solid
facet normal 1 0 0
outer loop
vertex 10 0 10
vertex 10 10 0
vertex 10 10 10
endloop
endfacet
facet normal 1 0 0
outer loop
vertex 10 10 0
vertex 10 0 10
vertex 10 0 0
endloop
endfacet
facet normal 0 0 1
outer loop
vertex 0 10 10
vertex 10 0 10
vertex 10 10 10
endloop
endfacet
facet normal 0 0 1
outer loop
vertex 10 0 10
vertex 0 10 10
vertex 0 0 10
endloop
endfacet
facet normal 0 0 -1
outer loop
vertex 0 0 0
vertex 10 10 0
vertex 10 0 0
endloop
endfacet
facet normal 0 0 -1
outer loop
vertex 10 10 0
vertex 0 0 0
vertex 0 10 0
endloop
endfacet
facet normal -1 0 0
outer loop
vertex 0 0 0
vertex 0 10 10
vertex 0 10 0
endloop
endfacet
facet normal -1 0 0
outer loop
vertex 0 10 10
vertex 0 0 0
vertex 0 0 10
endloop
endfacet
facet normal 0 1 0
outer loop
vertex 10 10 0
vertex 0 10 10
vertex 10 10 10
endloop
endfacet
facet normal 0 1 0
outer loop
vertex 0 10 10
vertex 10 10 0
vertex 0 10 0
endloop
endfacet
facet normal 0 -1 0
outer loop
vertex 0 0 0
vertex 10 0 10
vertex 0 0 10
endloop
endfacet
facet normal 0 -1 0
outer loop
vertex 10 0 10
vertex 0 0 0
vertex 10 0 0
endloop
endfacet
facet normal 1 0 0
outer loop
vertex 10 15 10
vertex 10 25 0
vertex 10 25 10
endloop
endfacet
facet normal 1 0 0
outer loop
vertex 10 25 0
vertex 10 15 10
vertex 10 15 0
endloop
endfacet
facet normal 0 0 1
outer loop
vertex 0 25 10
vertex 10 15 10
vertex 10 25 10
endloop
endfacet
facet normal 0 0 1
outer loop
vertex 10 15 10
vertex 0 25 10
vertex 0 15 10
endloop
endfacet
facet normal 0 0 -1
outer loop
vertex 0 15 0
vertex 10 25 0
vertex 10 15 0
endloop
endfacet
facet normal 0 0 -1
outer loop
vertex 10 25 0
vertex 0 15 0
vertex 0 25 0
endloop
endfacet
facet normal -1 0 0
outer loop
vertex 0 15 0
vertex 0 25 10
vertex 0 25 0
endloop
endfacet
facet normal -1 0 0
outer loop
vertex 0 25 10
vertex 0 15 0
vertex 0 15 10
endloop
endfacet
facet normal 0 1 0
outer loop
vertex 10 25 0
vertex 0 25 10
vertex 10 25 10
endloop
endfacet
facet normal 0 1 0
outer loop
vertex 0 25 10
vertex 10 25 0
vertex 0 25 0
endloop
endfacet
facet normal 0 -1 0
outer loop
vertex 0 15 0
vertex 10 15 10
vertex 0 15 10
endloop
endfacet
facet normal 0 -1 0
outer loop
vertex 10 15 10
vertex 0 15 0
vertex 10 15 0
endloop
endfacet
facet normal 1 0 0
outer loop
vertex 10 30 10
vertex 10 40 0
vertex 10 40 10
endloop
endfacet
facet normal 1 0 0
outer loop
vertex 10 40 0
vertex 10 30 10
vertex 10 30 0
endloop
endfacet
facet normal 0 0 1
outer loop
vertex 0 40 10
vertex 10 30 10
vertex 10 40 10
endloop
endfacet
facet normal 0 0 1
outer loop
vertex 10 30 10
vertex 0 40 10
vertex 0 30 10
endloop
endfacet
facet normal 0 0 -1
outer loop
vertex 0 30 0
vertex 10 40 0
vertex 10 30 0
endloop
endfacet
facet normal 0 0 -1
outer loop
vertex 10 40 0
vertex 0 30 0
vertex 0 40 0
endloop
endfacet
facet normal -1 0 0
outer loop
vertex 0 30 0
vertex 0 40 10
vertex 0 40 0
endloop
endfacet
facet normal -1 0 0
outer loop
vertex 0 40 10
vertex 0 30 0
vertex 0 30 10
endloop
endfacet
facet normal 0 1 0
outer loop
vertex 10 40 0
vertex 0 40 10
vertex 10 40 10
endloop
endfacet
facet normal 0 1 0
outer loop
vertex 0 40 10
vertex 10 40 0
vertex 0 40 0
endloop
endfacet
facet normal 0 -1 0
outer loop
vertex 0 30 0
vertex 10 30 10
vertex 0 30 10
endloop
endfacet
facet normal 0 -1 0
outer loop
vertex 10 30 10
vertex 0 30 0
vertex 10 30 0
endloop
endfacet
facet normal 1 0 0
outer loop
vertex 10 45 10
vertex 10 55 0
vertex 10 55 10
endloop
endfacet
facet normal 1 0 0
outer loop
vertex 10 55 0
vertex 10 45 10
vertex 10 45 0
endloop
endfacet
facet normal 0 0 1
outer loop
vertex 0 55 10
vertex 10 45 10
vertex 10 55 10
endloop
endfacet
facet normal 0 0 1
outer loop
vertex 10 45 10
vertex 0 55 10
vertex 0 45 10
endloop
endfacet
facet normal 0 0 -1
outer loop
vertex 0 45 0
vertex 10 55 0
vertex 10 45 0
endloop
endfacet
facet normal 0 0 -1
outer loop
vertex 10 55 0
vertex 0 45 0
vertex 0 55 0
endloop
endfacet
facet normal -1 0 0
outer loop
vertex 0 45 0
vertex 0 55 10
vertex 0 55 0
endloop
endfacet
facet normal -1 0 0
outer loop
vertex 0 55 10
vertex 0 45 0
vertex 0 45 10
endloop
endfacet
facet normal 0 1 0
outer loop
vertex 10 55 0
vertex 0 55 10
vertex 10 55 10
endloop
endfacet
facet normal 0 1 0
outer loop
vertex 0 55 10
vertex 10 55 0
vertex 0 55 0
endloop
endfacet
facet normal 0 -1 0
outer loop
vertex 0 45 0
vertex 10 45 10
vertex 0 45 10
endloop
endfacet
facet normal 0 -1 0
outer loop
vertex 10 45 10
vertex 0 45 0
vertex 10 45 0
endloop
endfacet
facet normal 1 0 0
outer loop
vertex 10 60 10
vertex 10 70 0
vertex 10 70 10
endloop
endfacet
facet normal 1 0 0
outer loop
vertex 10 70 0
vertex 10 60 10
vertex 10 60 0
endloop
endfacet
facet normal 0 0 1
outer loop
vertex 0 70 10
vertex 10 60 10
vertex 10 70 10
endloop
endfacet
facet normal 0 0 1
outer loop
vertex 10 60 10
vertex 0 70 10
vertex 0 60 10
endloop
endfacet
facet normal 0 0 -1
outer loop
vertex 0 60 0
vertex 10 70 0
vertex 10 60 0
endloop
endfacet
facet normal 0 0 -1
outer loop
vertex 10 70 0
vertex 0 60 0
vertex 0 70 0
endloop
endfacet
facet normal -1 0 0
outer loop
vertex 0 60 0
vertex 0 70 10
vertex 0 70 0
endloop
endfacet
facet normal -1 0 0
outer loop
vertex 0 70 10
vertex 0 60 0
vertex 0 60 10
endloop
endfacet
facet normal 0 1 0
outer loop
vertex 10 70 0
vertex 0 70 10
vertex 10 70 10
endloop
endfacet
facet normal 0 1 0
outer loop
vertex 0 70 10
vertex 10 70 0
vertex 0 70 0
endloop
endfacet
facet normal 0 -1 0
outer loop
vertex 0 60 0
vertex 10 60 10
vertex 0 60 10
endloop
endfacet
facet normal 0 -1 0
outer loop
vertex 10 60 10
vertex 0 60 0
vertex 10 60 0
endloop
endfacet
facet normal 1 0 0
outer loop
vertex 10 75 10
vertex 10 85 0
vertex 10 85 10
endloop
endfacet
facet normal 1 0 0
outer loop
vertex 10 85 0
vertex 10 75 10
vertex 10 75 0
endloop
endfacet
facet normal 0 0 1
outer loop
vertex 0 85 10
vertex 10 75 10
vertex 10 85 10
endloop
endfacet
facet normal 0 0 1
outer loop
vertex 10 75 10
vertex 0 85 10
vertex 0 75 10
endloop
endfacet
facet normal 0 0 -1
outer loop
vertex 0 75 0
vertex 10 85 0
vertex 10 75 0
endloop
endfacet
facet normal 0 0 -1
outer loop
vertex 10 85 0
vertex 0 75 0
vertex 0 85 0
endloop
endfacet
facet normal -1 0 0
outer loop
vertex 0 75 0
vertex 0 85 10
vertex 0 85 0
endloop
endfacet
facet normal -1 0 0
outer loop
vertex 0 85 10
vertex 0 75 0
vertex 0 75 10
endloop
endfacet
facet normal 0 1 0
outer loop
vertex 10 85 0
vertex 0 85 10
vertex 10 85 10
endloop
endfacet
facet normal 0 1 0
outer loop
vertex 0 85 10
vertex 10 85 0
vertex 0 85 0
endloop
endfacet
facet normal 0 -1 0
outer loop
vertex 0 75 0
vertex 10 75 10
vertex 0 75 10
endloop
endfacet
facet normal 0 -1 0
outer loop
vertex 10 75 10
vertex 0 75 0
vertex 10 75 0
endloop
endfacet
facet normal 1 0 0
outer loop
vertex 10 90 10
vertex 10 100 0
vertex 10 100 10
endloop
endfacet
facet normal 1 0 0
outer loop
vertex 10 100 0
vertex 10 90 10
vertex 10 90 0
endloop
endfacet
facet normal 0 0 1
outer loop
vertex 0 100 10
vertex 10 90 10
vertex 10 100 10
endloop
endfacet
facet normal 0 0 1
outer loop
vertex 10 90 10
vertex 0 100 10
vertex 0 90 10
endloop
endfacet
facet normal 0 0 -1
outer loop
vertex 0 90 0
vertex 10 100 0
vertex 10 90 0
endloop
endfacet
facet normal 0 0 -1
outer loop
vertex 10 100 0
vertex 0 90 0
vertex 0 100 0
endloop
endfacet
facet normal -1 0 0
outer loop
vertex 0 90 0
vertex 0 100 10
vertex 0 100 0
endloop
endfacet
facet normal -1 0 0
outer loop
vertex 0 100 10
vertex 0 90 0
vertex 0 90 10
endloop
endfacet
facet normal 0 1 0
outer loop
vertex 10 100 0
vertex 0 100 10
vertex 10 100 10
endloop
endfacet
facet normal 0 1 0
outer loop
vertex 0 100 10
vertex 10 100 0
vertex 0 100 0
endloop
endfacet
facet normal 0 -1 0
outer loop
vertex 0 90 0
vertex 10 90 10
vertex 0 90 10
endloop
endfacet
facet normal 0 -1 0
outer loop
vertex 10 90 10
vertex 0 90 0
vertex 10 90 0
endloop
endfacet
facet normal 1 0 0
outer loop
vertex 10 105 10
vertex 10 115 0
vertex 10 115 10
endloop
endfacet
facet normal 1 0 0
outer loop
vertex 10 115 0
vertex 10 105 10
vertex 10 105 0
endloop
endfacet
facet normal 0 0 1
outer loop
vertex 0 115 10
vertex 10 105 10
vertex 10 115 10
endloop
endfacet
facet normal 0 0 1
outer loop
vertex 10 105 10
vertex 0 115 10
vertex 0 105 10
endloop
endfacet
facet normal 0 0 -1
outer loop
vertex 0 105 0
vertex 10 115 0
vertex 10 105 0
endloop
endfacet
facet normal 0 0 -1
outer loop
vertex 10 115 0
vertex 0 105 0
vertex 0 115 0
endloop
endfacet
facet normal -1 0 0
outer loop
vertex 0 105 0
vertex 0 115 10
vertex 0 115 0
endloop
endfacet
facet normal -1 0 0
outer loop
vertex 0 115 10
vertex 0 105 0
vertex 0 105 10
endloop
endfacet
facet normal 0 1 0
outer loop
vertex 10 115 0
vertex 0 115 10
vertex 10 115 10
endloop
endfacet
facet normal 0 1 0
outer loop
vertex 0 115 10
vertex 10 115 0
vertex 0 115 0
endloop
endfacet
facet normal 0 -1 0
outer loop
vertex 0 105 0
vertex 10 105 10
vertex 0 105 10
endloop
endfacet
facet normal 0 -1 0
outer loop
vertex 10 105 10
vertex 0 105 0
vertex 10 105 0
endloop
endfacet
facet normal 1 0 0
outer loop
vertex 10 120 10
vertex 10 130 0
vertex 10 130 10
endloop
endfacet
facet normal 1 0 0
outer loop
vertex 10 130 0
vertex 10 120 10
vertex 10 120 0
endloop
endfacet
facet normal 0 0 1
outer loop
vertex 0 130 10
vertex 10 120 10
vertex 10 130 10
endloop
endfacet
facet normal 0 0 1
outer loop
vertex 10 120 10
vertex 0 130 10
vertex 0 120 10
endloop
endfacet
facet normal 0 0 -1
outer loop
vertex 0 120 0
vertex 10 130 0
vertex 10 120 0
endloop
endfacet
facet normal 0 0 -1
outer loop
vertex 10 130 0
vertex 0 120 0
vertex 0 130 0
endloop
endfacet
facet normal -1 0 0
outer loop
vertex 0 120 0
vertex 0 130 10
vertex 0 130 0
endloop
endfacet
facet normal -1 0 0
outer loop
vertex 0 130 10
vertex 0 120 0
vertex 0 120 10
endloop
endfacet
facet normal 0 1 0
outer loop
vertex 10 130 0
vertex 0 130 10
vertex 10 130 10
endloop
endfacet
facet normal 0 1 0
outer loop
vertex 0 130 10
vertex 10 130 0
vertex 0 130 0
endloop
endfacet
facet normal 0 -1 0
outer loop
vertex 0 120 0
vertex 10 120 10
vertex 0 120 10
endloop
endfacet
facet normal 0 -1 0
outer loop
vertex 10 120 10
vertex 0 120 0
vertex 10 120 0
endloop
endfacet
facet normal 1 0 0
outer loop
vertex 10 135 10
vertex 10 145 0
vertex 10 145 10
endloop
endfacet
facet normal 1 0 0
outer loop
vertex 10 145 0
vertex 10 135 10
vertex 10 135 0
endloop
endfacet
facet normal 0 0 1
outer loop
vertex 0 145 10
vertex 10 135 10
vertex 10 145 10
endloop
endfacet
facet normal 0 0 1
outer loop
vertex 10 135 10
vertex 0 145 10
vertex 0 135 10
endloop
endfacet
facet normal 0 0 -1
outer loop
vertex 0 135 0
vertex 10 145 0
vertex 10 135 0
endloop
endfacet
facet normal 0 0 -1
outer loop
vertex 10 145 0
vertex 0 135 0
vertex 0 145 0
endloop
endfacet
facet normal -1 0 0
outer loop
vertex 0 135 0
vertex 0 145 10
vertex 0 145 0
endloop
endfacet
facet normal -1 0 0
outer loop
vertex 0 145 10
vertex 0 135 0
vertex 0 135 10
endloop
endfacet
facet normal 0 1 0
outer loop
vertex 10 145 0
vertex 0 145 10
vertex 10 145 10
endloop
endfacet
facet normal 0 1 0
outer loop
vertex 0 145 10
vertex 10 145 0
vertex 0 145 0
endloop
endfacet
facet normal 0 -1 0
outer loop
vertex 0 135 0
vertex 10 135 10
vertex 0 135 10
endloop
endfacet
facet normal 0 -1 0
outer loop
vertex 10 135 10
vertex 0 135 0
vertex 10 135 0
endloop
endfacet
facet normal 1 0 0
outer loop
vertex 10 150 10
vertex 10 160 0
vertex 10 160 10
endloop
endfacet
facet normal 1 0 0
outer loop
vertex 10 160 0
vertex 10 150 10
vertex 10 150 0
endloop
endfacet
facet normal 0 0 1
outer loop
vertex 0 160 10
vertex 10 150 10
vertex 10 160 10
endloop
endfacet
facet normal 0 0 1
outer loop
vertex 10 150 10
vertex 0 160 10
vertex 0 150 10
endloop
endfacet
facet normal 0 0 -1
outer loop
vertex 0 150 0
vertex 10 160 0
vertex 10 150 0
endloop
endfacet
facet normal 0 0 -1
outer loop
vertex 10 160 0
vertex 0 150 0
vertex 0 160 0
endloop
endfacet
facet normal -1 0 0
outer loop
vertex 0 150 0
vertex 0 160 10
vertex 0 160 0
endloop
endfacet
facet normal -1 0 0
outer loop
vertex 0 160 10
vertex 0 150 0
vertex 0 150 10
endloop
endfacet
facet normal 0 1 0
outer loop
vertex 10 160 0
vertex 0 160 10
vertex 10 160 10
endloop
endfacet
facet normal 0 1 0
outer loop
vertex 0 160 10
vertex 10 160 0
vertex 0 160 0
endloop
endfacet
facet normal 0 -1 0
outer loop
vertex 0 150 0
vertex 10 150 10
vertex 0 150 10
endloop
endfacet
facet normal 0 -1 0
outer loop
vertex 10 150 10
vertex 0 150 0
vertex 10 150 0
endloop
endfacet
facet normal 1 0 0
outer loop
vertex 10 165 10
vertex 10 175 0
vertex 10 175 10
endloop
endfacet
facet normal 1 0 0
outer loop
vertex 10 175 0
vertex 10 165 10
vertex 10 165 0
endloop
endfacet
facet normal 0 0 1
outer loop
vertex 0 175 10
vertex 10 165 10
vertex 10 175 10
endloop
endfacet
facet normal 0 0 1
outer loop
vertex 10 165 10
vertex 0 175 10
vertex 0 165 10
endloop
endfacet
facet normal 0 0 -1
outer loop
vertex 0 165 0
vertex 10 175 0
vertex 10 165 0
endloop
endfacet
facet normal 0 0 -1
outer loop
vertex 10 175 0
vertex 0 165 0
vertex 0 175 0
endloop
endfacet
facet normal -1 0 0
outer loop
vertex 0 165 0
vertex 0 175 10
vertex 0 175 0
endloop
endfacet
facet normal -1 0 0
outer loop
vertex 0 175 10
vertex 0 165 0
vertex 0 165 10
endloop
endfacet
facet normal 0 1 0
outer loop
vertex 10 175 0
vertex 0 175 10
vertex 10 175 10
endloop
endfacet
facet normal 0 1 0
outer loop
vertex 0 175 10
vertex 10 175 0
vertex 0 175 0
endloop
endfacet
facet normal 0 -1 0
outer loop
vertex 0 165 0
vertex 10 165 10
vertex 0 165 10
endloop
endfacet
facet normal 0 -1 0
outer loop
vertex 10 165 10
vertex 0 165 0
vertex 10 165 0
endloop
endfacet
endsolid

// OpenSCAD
// color scheme generator
// copy and paste console output to /usr/share/openscad/color-schemes/render/redcyanglasses.json

background         = hsv_deg(0, 0, 95);
highlight          = hsv_deg(300,90,100);
axes_color         = hsv_deg(300,90,100);
opencsg_face_front = hsv_deg(60,90,100);
opencsg_face_back  = hsv_deg(300,90,100);
cgal_face_front    = hsv_deg(60,90,100);
cgal_face_back     = hsv_deg(300,90,100);
cgal_face_2d       = hsv_deg(60,90,100);
cgal_edge_front    = hsv_deg(300,90,100);
cgal_edge_back     = hsv_deg(300,90,100);
cgal_edge_2d       = hsv_deg(300,90,100);
crosshair          = hsv_deg(300,90,100);

// set viewport
$vpt=[68, 88, 5];
$vpr=[0, 0, 0];
$vpd=550;

function hsv_deg(h, s, v) = hsv(h/360,s/100,v/100, 1);
function hsv(h, s = 1, v = 1, a = 1, p, q, t) = (p == undef || q == undef || t == undef) // by LightAtPlay
	? hsv(
		(h%1) * 6,
		s<0?0:s>1?1:s,
		v<0?0:v>1?1:v,
		a,
		(v<0?0:v>1?1:v) * (1 - (s<0?0:s>1?1:s)),
		(v<0?0:v>1?1:v) * (1 - (s<0?0:s>1?1:s) * ((h%1)*6-floor((h%1)*6))),
		(v<0?0:v>1?1:v) * (1 - (s<0?0:s>1?1:s) * (1 - ((h%1)*6-floor((h%1)*6))))
	)
	:
	h < 1 ? [v,t,p,a] :
	h < 2 ? [q,v,p,a] :
	h < 3 ? [p,v,t,a] :
	h < 4 ? [p,q,v,a] :
	h < 5 ? [t,p,v,a] :
	        [v,p,q,a];

hexchars="0123456789ABCDEF";
function hex(a) = str(hexchars[(a / 16) % 16] , hexchars[a % 16]);
function color_to_hex(c) = str(hex(c[0]*255), hex(c[1]*255), hex(c[2]*255));

cs = str(
    "copy and paste to .json:\n",
    "{\n",
    "    \"name\" : \"3D Glasses\",\n",
    "    \"index\" : 2001,\n",
    "    \"show-in-gui\" : true,\n",
    "    \"description\" : \"3d anaglyph\",\n",
    "    \"_comment\" : \"created by colorscheme.scad\",\n",
    "\n",
    "    \"colors\" : {\n",
    "        \"background\" :         \"#", color_to_hex(background), "\",\n",
    "        \"highlight\" :          \"#", color_to_hex(highlight), "80\",\n",
    "        \"axes-color\" :         \"#", color_to_hex(axes_color), "\",\n",
    "        \"opencsg-face-front\" : \"#", color_to_hex(opencsg_face_front), "\",\n",
    "        \"opencsg-face-back\" :  \"#", color_to_hex(opencsg_face_back), "\",\n",
    "        \"cgal-face-front\" :    \"#", color_to_hex(cgal_face_front), "\",\n",
    "        \"cgal-face-back\" :     \"#", color_to_hex(cgal_face_back), "\",\n",
    "        \"cgal-face-2d\" :       \"#", color_to_hex(cgal_face_2d), "\",\n",
    "        \"cgal-edge-front\" :    \"#", color_to_hex(cgal_edge_front), "\",\n",
    "        \"cgal-edge-back\" :     \"#", color_to_hex(cgal_edge_back), "\",\n",
    "        \"cgal-edge-2d\" :       \"#", color_to_hex(cgal_edge_2d), "\",\n",
    "        \"crosshair\" :          \"#", color_to_hex(crosshair), "\"\n",
    "    }\n",
    "}\n"
    );
    
echo(cs);    

// display colors

colors = [
    background,
    highlight,
    axes_color,
    opencsg_face_front,
    opencsg_face_back,
    cgal_face_front,
    cgal_face_back,
    cgal_face_2d,
    cgal_edge_front,
    cgal_edge_back,
    cgal_edge_2d,
    crosshair];
    
names = [
    "background",
    "highlight",
    "axes_color",
    "opencsg_face_front",
    "opencsg_face_back",
    "cgal_face_front",
    "cgal_face_back",
    "cgal_face_2d",
    "cgal_edge_front",
    "cgal_edge_back",
    "cgal_edge_2d",
    "crosshair"];
  
for (i = [0:len(colors)-1]) {
    translate([0, i*15, 0])
    color(colors[i])
    cube(10);
    translate([15, i*15, 0])
    text(names[i], valign = "bottom");
}

// not truncated
